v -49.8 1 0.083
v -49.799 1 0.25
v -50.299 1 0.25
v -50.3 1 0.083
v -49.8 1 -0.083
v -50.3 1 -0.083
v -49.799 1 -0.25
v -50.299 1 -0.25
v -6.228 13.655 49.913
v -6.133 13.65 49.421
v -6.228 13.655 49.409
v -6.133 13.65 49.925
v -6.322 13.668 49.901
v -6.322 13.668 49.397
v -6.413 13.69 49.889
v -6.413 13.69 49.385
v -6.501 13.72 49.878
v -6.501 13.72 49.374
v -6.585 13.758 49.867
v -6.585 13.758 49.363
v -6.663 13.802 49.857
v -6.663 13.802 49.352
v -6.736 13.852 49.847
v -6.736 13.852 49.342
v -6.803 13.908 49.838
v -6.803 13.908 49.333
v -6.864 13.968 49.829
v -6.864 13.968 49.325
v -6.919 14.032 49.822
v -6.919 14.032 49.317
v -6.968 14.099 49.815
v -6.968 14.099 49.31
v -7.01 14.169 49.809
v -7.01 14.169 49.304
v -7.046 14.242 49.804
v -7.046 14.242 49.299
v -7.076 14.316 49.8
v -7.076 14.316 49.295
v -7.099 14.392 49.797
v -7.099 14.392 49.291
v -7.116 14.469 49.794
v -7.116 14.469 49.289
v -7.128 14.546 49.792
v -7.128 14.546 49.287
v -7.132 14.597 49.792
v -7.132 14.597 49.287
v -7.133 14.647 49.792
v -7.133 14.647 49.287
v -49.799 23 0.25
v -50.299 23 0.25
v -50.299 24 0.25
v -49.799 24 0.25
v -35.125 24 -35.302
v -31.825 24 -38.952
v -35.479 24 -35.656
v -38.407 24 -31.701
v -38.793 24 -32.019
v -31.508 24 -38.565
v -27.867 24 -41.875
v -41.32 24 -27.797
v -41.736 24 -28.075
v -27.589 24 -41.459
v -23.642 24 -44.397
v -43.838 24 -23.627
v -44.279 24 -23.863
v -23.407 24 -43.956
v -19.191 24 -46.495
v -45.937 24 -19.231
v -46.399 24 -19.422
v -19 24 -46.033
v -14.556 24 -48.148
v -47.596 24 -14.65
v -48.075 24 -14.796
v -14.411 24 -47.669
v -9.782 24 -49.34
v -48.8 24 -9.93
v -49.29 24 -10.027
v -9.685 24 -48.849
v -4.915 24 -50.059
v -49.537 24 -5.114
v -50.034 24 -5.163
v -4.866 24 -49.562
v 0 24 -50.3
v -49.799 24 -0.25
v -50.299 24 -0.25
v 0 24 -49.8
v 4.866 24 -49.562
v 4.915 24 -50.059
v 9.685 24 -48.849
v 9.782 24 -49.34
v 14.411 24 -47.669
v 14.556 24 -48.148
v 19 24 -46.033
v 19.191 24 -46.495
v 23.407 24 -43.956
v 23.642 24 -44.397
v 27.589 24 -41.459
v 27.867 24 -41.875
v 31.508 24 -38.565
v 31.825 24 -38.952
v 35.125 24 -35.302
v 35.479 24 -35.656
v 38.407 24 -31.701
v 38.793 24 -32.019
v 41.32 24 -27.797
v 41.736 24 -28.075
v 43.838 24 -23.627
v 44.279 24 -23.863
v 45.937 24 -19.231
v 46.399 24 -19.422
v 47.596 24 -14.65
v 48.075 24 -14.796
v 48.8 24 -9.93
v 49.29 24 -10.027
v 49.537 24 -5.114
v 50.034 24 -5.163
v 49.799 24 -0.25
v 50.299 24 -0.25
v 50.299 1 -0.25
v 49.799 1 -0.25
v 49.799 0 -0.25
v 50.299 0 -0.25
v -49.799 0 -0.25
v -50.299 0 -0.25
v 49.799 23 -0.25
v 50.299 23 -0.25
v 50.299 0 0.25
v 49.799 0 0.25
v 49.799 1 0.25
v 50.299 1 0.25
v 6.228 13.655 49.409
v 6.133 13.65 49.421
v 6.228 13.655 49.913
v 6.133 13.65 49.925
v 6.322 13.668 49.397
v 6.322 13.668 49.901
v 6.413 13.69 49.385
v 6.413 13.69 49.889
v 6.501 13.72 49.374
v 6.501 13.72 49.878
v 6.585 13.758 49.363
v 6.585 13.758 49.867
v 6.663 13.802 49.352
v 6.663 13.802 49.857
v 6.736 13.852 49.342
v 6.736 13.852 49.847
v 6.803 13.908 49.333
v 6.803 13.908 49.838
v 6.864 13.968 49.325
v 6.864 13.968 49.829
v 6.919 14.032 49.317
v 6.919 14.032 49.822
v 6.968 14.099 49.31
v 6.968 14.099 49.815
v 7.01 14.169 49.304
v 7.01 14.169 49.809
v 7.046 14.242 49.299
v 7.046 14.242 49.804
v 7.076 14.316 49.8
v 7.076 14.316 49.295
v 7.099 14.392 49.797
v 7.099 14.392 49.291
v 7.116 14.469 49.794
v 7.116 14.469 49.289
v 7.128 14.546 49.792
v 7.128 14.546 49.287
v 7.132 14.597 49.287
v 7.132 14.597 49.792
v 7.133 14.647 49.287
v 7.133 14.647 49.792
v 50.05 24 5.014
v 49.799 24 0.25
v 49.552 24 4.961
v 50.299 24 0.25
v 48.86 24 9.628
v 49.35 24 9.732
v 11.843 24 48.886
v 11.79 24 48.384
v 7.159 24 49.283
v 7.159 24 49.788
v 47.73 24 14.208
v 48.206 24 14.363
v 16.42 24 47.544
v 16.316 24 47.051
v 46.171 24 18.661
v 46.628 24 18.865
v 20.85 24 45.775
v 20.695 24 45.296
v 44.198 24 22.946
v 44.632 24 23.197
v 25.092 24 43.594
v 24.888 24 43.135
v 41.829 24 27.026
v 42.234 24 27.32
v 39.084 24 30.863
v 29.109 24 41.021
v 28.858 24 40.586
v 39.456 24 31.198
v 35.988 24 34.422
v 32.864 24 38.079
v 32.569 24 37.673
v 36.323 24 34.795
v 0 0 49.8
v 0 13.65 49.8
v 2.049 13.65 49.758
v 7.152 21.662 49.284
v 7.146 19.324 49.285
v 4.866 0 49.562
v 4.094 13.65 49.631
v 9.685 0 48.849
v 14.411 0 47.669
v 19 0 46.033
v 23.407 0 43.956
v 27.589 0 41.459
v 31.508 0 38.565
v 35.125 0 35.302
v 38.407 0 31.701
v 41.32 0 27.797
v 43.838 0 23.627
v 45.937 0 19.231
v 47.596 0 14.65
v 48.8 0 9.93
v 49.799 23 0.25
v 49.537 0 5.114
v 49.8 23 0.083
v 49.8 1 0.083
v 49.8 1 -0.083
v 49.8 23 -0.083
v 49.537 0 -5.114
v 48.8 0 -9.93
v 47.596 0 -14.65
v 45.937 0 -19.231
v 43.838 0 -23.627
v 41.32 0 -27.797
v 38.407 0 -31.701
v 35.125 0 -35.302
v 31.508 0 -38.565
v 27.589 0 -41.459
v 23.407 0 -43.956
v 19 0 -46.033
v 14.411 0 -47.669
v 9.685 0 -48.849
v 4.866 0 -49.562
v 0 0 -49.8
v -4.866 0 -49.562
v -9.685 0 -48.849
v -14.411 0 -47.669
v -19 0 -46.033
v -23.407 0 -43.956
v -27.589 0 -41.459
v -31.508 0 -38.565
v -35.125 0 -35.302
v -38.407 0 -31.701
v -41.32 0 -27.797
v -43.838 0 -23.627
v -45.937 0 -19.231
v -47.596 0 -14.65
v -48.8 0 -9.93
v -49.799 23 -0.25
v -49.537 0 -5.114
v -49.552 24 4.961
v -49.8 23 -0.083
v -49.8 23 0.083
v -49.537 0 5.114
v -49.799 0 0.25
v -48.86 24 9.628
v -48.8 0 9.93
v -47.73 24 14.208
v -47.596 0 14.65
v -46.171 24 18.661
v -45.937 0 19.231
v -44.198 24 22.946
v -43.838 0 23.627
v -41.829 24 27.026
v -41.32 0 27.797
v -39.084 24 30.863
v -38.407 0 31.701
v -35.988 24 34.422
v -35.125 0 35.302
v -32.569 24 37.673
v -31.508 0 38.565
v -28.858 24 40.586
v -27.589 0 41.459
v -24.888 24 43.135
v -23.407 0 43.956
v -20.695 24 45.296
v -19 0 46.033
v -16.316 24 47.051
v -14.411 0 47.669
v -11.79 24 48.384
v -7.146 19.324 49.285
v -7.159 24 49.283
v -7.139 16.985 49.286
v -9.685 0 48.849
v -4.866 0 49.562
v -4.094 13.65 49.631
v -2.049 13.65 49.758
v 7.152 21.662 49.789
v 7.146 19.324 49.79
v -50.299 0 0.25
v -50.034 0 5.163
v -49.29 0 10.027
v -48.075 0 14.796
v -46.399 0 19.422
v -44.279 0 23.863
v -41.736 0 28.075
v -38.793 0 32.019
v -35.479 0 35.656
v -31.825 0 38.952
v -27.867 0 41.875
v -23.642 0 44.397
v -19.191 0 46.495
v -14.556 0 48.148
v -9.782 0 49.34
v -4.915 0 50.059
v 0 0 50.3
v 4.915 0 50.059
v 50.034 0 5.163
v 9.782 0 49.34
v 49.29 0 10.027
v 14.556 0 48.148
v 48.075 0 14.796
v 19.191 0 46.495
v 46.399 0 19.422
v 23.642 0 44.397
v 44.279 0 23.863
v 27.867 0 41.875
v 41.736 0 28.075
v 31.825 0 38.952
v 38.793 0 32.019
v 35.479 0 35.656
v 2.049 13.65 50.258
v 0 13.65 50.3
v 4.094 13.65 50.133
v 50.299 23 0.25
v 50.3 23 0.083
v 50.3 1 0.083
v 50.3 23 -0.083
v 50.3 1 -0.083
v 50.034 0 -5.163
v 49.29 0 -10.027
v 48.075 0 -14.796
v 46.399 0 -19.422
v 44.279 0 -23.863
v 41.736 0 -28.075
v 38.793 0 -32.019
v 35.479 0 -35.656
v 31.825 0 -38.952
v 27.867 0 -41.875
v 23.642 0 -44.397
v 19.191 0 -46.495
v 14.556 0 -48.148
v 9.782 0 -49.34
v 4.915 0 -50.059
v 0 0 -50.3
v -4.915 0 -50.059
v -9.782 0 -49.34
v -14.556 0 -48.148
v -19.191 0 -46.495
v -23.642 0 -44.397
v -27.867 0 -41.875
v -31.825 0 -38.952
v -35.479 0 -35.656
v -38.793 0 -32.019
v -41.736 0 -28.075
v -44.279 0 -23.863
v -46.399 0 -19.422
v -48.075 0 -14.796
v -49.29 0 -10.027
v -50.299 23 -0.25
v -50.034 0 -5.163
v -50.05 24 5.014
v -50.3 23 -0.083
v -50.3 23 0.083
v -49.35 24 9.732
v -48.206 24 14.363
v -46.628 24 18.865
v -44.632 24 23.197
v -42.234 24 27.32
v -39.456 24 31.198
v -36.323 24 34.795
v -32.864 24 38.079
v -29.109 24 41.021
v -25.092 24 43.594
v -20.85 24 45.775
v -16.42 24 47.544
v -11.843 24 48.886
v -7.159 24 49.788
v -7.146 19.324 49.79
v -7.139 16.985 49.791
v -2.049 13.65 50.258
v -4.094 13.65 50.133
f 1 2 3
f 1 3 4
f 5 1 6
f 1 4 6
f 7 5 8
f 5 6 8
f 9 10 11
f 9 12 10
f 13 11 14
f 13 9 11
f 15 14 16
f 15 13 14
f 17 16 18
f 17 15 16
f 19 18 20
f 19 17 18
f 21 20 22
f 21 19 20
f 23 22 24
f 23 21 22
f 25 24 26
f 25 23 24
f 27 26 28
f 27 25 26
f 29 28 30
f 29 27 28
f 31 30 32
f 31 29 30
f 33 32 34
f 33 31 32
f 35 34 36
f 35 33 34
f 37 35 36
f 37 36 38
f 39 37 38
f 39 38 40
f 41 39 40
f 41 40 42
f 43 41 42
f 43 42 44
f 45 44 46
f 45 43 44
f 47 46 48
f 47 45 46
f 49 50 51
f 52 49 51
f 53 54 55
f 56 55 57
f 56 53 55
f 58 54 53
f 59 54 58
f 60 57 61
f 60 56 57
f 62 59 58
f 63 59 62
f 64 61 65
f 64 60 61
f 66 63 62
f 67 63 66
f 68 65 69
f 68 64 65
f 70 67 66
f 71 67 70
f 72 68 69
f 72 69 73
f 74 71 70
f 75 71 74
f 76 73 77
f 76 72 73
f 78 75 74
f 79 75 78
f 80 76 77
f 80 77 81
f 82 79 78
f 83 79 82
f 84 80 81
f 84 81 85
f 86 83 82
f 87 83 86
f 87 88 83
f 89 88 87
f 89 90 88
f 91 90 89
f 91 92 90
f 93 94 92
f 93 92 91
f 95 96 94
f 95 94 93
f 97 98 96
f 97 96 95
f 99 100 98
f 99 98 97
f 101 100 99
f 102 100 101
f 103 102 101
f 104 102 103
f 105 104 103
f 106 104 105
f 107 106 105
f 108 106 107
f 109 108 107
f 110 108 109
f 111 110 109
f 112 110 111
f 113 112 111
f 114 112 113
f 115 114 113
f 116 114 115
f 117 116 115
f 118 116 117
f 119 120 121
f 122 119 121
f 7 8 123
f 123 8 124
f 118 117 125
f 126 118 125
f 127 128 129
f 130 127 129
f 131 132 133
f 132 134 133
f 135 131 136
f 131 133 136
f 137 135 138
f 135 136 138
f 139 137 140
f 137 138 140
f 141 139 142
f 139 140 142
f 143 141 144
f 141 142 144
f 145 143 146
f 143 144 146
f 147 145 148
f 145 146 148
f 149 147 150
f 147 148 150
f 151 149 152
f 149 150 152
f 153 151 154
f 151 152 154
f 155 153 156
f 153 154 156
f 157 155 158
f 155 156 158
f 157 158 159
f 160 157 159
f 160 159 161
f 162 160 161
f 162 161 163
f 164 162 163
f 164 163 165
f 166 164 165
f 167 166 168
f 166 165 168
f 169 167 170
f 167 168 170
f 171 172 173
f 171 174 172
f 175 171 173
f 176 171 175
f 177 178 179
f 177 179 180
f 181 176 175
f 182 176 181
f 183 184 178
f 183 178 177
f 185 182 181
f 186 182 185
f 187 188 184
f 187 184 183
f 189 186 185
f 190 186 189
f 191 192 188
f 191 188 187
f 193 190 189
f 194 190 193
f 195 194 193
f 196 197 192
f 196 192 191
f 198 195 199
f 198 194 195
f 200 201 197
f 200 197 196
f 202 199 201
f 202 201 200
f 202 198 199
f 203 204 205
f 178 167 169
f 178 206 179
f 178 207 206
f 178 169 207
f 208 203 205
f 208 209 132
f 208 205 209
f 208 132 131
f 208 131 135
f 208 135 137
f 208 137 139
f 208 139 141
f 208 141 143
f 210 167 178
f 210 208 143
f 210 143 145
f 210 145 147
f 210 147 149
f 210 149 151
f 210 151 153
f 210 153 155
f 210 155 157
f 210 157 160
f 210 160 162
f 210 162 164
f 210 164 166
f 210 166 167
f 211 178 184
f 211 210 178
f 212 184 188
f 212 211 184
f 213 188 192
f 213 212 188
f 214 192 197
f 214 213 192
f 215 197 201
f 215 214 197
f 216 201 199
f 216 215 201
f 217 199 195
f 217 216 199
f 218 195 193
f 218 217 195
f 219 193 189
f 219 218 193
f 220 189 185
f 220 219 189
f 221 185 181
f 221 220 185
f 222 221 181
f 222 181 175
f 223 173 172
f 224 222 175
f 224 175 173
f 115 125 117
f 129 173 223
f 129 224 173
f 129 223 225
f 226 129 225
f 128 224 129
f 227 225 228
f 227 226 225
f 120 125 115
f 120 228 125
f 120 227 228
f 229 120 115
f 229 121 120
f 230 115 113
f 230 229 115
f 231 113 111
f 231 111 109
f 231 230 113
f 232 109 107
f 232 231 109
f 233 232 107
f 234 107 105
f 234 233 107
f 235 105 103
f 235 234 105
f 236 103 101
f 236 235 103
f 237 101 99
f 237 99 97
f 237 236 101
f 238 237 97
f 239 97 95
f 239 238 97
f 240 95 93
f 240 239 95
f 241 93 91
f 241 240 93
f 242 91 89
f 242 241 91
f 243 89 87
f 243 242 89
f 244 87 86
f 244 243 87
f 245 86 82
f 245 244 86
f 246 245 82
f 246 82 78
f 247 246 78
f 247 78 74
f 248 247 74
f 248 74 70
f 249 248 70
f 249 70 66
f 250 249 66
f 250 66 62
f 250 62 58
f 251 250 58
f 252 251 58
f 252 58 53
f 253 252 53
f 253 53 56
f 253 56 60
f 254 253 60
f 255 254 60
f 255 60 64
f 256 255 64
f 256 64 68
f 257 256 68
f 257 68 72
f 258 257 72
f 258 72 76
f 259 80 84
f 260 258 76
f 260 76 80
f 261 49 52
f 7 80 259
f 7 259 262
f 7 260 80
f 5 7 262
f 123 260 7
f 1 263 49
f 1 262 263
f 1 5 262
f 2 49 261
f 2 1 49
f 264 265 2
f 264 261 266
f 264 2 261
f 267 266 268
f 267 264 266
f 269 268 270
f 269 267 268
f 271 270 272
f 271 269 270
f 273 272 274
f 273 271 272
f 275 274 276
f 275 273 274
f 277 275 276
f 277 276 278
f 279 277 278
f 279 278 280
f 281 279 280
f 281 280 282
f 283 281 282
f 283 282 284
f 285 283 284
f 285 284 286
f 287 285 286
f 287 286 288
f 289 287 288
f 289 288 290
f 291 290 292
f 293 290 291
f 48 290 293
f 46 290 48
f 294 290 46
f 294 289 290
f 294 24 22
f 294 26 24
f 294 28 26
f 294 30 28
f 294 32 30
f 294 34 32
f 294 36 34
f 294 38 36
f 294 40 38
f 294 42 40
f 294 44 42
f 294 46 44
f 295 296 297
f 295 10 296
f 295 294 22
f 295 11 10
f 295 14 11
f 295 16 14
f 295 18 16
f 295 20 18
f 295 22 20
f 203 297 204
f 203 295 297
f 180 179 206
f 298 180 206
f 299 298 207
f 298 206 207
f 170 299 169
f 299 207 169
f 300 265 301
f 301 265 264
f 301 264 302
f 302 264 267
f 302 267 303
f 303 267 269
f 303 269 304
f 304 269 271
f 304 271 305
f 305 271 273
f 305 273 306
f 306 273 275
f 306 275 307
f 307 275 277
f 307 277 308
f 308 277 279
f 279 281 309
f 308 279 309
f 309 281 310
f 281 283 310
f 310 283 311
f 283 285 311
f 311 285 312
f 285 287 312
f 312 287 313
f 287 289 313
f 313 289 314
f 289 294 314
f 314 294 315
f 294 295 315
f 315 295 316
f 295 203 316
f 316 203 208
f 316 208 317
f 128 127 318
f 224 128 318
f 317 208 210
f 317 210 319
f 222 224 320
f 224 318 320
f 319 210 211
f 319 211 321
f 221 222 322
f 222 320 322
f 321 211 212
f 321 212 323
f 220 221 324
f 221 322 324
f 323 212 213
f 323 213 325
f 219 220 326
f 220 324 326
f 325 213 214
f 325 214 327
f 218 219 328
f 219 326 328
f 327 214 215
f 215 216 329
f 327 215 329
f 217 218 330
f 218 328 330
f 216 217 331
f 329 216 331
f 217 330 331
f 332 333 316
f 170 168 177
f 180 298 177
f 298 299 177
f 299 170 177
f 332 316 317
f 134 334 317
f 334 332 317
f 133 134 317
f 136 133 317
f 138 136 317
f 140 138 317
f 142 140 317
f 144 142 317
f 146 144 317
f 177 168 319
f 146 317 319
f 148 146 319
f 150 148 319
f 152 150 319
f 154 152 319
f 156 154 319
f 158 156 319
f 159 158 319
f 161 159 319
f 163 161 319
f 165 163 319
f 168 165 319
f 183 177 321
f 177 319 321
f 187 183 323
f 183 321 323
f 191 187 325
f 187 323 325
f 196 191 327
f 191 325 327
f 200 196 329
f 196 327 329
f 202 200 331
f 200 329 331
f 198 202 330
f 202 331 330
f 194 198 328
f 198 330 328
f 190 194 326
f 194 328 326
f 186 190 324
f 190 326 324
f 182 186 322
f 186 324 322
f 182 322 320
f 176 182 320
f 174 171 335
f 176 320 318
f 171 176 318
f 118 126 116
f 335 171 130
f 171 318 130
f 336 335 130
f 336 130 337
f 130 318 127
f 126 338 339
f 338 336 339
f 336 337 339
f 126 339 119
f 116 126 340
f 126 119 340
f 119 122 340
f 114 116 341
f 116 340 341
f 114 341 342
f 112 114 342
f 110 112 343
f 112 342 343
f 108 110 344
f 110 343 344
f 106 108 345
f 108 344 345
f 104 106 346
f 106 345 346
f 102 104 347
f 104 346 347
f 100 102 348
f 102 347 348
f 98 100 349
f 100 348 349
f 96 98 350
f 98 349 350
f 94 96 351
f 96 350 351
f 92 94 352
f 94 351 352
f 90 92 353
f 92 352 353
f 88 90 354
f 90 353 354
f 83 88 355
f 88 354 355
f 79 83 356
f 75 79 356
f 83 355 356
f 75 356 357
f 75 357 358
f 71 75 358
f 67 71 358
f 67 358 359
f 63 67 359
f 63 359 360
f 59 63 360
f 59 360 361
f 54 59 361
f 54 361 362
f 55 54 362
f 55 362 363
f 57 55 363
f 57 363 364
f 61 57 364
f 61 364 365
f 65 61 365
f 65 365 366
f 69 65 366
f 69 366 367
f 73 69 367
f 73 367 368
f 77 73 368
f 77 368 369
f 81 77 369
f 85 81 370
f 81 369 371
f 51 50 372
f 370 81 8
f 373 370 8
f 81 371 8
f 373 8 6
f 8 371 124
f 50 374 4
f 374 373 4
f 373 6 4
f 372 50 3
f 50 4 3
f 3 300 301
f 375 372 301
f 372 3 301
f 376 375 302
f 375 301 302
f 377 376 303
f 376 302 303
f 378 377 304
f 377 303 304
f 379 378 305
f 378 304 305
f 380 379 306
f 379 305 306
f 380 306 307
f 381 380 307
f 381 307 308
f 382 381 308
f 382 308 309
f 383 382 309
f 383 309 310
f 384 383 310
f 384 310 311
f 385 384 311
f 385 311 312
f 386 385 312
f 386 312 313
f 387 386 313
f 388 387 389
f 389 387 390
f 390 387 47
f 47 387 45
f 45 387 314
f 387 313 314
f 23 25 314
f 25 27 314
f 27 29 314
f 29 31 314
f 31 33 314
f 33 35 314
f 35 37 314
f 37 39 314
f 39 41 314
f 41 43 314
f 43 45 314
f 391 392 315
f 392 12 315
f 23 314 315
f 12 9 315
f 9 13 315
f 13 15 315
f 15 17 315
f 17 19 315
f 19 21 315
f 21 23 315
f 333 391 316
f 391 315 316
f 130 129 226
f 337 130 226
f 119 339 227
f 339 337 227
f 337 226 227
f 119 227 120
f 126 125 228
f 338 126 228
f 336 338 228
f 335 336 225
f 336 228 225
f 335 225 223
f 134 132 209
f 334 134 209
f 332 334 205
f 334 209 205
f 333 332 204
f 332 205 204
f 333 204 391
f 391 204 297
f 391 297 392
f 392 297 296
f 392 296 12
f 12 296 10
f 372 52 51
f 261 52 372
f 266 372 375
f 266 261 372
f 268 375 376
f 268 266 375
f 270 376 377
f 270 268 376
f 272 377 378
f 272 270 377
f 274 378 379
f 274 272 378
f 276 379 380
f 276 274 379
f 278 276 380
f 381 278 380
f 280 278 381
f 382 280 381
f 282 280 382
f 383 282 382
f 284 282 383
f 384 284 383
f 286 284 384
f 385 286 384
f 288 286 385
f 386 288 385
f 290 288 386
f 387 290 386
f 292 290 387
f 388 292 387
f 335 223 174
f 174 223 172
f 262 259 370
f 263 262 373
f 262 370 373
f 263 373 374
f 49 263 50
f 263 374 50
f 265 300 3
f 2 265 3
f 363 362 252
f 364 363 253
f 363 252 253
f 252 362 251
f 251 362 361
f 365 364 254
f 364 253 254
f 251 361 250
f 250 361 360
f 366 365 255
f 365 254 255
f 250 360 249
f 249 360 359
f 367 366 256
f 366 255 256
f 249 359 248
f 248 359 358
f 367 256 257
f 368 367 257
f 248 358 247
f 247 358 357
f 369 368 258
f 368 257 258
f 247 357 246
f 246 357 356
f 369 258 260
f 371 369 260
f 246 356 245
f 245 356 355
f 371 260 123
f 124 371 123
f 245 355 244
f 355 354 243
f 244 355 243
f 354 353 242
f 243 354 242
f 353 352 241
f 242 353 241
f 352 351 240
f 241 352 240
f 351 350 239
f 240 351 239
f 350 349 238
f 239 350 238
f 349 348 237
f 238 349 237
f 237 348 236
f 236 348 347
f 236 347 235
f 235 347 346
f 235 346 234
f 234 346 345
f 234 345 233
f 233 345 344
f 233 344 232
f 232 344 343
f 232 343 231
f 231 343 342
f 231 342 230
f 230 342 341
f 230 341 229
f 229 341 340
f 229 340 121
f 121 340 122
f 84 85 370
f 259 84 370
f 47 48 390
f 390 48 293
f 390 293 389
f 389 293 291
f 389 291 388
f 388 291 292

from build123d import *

# Parameters (mm, degrees)
SKETCH_1_R               = 50.3
SKETCH_1_R_2             = 49.8
EXTRUDE_1_DEPTH          = 24
CUT_EXTRUDE_1_DEPTH      = 52
CUT_EXTRUDE_2_DEPTH      = 52
CUT_EXTRUDE_2_DEPTH_BACK = 52
FILLET_1_R               = 1


with BuildPart() as part:
    # Эскиз1 → Бобышка-Вытянуть1 (new body)
    with BuildSketch(Plane(origin=(0, 0, 0), x_dir=(1, 0, 0), z_dir=(0, 1, 0))):
        with Locations(Location((0, 0, 0), (0, 0, 270))):
            Circle(SKETCH_1_R)
        with Locations(Location((0, 0, 0), (0, 0, 270))):
            Circle(SKETCH_1_R_2, mode=Mode.SUBTRACT)
    extrude(amount=EXTRUDE_1_DEPTH)

    # Эскиз2 → Вырез-Вытянуть1 (cut)
    with BuildSketch(Plane.XY):
        Polygon((-7.130200452, 13.65), (-7.158835795, 24), (7.158835795, 24), (7.130200452, 13.65), align=None)
    extrude(amount=CUT_EXTRUDE_1_DEPTH, mode=Mode.SUBTRACT)

    # Эскиз3 → Вырез-Вытянуть2 (cut, two sides: drawn at the far end of the back side and taken through both)
    with BuildSketch(Plane(origin=(0, 0, 0), x_dir=(0, 0, -1), z_dir=(1, 0, 0)).offset(-CUT_EXTRUDE_2_DEPTH_BACK)):
        Polygon((0, 24), (0.25, 24), (0.25, 23), (-0.25, 23), (-0.25, 24), align=None)
        Polygon((0.25, 1), (0.25, 0), (0, 0), (-0.25, 0), (-0.25, 1), align=None)
    extrude(amount=CUT_EXTRUDE_2_DEPTH + CUT_EXTRUDE_2_DEPTH_BACK, mode=Mode.SUBTRACT)

    # Скругление1
    fillet_1_edges = [part.edges().sort_by_distance(p)[0] for p in [
        (7.130200452, 13.65, 49.539493808),
        (-7.130200452, 13.65, 49.539493808),
    ]]
    fillet(fillet_1_edges, radius=FILLET_1_R)


solid = part.part
